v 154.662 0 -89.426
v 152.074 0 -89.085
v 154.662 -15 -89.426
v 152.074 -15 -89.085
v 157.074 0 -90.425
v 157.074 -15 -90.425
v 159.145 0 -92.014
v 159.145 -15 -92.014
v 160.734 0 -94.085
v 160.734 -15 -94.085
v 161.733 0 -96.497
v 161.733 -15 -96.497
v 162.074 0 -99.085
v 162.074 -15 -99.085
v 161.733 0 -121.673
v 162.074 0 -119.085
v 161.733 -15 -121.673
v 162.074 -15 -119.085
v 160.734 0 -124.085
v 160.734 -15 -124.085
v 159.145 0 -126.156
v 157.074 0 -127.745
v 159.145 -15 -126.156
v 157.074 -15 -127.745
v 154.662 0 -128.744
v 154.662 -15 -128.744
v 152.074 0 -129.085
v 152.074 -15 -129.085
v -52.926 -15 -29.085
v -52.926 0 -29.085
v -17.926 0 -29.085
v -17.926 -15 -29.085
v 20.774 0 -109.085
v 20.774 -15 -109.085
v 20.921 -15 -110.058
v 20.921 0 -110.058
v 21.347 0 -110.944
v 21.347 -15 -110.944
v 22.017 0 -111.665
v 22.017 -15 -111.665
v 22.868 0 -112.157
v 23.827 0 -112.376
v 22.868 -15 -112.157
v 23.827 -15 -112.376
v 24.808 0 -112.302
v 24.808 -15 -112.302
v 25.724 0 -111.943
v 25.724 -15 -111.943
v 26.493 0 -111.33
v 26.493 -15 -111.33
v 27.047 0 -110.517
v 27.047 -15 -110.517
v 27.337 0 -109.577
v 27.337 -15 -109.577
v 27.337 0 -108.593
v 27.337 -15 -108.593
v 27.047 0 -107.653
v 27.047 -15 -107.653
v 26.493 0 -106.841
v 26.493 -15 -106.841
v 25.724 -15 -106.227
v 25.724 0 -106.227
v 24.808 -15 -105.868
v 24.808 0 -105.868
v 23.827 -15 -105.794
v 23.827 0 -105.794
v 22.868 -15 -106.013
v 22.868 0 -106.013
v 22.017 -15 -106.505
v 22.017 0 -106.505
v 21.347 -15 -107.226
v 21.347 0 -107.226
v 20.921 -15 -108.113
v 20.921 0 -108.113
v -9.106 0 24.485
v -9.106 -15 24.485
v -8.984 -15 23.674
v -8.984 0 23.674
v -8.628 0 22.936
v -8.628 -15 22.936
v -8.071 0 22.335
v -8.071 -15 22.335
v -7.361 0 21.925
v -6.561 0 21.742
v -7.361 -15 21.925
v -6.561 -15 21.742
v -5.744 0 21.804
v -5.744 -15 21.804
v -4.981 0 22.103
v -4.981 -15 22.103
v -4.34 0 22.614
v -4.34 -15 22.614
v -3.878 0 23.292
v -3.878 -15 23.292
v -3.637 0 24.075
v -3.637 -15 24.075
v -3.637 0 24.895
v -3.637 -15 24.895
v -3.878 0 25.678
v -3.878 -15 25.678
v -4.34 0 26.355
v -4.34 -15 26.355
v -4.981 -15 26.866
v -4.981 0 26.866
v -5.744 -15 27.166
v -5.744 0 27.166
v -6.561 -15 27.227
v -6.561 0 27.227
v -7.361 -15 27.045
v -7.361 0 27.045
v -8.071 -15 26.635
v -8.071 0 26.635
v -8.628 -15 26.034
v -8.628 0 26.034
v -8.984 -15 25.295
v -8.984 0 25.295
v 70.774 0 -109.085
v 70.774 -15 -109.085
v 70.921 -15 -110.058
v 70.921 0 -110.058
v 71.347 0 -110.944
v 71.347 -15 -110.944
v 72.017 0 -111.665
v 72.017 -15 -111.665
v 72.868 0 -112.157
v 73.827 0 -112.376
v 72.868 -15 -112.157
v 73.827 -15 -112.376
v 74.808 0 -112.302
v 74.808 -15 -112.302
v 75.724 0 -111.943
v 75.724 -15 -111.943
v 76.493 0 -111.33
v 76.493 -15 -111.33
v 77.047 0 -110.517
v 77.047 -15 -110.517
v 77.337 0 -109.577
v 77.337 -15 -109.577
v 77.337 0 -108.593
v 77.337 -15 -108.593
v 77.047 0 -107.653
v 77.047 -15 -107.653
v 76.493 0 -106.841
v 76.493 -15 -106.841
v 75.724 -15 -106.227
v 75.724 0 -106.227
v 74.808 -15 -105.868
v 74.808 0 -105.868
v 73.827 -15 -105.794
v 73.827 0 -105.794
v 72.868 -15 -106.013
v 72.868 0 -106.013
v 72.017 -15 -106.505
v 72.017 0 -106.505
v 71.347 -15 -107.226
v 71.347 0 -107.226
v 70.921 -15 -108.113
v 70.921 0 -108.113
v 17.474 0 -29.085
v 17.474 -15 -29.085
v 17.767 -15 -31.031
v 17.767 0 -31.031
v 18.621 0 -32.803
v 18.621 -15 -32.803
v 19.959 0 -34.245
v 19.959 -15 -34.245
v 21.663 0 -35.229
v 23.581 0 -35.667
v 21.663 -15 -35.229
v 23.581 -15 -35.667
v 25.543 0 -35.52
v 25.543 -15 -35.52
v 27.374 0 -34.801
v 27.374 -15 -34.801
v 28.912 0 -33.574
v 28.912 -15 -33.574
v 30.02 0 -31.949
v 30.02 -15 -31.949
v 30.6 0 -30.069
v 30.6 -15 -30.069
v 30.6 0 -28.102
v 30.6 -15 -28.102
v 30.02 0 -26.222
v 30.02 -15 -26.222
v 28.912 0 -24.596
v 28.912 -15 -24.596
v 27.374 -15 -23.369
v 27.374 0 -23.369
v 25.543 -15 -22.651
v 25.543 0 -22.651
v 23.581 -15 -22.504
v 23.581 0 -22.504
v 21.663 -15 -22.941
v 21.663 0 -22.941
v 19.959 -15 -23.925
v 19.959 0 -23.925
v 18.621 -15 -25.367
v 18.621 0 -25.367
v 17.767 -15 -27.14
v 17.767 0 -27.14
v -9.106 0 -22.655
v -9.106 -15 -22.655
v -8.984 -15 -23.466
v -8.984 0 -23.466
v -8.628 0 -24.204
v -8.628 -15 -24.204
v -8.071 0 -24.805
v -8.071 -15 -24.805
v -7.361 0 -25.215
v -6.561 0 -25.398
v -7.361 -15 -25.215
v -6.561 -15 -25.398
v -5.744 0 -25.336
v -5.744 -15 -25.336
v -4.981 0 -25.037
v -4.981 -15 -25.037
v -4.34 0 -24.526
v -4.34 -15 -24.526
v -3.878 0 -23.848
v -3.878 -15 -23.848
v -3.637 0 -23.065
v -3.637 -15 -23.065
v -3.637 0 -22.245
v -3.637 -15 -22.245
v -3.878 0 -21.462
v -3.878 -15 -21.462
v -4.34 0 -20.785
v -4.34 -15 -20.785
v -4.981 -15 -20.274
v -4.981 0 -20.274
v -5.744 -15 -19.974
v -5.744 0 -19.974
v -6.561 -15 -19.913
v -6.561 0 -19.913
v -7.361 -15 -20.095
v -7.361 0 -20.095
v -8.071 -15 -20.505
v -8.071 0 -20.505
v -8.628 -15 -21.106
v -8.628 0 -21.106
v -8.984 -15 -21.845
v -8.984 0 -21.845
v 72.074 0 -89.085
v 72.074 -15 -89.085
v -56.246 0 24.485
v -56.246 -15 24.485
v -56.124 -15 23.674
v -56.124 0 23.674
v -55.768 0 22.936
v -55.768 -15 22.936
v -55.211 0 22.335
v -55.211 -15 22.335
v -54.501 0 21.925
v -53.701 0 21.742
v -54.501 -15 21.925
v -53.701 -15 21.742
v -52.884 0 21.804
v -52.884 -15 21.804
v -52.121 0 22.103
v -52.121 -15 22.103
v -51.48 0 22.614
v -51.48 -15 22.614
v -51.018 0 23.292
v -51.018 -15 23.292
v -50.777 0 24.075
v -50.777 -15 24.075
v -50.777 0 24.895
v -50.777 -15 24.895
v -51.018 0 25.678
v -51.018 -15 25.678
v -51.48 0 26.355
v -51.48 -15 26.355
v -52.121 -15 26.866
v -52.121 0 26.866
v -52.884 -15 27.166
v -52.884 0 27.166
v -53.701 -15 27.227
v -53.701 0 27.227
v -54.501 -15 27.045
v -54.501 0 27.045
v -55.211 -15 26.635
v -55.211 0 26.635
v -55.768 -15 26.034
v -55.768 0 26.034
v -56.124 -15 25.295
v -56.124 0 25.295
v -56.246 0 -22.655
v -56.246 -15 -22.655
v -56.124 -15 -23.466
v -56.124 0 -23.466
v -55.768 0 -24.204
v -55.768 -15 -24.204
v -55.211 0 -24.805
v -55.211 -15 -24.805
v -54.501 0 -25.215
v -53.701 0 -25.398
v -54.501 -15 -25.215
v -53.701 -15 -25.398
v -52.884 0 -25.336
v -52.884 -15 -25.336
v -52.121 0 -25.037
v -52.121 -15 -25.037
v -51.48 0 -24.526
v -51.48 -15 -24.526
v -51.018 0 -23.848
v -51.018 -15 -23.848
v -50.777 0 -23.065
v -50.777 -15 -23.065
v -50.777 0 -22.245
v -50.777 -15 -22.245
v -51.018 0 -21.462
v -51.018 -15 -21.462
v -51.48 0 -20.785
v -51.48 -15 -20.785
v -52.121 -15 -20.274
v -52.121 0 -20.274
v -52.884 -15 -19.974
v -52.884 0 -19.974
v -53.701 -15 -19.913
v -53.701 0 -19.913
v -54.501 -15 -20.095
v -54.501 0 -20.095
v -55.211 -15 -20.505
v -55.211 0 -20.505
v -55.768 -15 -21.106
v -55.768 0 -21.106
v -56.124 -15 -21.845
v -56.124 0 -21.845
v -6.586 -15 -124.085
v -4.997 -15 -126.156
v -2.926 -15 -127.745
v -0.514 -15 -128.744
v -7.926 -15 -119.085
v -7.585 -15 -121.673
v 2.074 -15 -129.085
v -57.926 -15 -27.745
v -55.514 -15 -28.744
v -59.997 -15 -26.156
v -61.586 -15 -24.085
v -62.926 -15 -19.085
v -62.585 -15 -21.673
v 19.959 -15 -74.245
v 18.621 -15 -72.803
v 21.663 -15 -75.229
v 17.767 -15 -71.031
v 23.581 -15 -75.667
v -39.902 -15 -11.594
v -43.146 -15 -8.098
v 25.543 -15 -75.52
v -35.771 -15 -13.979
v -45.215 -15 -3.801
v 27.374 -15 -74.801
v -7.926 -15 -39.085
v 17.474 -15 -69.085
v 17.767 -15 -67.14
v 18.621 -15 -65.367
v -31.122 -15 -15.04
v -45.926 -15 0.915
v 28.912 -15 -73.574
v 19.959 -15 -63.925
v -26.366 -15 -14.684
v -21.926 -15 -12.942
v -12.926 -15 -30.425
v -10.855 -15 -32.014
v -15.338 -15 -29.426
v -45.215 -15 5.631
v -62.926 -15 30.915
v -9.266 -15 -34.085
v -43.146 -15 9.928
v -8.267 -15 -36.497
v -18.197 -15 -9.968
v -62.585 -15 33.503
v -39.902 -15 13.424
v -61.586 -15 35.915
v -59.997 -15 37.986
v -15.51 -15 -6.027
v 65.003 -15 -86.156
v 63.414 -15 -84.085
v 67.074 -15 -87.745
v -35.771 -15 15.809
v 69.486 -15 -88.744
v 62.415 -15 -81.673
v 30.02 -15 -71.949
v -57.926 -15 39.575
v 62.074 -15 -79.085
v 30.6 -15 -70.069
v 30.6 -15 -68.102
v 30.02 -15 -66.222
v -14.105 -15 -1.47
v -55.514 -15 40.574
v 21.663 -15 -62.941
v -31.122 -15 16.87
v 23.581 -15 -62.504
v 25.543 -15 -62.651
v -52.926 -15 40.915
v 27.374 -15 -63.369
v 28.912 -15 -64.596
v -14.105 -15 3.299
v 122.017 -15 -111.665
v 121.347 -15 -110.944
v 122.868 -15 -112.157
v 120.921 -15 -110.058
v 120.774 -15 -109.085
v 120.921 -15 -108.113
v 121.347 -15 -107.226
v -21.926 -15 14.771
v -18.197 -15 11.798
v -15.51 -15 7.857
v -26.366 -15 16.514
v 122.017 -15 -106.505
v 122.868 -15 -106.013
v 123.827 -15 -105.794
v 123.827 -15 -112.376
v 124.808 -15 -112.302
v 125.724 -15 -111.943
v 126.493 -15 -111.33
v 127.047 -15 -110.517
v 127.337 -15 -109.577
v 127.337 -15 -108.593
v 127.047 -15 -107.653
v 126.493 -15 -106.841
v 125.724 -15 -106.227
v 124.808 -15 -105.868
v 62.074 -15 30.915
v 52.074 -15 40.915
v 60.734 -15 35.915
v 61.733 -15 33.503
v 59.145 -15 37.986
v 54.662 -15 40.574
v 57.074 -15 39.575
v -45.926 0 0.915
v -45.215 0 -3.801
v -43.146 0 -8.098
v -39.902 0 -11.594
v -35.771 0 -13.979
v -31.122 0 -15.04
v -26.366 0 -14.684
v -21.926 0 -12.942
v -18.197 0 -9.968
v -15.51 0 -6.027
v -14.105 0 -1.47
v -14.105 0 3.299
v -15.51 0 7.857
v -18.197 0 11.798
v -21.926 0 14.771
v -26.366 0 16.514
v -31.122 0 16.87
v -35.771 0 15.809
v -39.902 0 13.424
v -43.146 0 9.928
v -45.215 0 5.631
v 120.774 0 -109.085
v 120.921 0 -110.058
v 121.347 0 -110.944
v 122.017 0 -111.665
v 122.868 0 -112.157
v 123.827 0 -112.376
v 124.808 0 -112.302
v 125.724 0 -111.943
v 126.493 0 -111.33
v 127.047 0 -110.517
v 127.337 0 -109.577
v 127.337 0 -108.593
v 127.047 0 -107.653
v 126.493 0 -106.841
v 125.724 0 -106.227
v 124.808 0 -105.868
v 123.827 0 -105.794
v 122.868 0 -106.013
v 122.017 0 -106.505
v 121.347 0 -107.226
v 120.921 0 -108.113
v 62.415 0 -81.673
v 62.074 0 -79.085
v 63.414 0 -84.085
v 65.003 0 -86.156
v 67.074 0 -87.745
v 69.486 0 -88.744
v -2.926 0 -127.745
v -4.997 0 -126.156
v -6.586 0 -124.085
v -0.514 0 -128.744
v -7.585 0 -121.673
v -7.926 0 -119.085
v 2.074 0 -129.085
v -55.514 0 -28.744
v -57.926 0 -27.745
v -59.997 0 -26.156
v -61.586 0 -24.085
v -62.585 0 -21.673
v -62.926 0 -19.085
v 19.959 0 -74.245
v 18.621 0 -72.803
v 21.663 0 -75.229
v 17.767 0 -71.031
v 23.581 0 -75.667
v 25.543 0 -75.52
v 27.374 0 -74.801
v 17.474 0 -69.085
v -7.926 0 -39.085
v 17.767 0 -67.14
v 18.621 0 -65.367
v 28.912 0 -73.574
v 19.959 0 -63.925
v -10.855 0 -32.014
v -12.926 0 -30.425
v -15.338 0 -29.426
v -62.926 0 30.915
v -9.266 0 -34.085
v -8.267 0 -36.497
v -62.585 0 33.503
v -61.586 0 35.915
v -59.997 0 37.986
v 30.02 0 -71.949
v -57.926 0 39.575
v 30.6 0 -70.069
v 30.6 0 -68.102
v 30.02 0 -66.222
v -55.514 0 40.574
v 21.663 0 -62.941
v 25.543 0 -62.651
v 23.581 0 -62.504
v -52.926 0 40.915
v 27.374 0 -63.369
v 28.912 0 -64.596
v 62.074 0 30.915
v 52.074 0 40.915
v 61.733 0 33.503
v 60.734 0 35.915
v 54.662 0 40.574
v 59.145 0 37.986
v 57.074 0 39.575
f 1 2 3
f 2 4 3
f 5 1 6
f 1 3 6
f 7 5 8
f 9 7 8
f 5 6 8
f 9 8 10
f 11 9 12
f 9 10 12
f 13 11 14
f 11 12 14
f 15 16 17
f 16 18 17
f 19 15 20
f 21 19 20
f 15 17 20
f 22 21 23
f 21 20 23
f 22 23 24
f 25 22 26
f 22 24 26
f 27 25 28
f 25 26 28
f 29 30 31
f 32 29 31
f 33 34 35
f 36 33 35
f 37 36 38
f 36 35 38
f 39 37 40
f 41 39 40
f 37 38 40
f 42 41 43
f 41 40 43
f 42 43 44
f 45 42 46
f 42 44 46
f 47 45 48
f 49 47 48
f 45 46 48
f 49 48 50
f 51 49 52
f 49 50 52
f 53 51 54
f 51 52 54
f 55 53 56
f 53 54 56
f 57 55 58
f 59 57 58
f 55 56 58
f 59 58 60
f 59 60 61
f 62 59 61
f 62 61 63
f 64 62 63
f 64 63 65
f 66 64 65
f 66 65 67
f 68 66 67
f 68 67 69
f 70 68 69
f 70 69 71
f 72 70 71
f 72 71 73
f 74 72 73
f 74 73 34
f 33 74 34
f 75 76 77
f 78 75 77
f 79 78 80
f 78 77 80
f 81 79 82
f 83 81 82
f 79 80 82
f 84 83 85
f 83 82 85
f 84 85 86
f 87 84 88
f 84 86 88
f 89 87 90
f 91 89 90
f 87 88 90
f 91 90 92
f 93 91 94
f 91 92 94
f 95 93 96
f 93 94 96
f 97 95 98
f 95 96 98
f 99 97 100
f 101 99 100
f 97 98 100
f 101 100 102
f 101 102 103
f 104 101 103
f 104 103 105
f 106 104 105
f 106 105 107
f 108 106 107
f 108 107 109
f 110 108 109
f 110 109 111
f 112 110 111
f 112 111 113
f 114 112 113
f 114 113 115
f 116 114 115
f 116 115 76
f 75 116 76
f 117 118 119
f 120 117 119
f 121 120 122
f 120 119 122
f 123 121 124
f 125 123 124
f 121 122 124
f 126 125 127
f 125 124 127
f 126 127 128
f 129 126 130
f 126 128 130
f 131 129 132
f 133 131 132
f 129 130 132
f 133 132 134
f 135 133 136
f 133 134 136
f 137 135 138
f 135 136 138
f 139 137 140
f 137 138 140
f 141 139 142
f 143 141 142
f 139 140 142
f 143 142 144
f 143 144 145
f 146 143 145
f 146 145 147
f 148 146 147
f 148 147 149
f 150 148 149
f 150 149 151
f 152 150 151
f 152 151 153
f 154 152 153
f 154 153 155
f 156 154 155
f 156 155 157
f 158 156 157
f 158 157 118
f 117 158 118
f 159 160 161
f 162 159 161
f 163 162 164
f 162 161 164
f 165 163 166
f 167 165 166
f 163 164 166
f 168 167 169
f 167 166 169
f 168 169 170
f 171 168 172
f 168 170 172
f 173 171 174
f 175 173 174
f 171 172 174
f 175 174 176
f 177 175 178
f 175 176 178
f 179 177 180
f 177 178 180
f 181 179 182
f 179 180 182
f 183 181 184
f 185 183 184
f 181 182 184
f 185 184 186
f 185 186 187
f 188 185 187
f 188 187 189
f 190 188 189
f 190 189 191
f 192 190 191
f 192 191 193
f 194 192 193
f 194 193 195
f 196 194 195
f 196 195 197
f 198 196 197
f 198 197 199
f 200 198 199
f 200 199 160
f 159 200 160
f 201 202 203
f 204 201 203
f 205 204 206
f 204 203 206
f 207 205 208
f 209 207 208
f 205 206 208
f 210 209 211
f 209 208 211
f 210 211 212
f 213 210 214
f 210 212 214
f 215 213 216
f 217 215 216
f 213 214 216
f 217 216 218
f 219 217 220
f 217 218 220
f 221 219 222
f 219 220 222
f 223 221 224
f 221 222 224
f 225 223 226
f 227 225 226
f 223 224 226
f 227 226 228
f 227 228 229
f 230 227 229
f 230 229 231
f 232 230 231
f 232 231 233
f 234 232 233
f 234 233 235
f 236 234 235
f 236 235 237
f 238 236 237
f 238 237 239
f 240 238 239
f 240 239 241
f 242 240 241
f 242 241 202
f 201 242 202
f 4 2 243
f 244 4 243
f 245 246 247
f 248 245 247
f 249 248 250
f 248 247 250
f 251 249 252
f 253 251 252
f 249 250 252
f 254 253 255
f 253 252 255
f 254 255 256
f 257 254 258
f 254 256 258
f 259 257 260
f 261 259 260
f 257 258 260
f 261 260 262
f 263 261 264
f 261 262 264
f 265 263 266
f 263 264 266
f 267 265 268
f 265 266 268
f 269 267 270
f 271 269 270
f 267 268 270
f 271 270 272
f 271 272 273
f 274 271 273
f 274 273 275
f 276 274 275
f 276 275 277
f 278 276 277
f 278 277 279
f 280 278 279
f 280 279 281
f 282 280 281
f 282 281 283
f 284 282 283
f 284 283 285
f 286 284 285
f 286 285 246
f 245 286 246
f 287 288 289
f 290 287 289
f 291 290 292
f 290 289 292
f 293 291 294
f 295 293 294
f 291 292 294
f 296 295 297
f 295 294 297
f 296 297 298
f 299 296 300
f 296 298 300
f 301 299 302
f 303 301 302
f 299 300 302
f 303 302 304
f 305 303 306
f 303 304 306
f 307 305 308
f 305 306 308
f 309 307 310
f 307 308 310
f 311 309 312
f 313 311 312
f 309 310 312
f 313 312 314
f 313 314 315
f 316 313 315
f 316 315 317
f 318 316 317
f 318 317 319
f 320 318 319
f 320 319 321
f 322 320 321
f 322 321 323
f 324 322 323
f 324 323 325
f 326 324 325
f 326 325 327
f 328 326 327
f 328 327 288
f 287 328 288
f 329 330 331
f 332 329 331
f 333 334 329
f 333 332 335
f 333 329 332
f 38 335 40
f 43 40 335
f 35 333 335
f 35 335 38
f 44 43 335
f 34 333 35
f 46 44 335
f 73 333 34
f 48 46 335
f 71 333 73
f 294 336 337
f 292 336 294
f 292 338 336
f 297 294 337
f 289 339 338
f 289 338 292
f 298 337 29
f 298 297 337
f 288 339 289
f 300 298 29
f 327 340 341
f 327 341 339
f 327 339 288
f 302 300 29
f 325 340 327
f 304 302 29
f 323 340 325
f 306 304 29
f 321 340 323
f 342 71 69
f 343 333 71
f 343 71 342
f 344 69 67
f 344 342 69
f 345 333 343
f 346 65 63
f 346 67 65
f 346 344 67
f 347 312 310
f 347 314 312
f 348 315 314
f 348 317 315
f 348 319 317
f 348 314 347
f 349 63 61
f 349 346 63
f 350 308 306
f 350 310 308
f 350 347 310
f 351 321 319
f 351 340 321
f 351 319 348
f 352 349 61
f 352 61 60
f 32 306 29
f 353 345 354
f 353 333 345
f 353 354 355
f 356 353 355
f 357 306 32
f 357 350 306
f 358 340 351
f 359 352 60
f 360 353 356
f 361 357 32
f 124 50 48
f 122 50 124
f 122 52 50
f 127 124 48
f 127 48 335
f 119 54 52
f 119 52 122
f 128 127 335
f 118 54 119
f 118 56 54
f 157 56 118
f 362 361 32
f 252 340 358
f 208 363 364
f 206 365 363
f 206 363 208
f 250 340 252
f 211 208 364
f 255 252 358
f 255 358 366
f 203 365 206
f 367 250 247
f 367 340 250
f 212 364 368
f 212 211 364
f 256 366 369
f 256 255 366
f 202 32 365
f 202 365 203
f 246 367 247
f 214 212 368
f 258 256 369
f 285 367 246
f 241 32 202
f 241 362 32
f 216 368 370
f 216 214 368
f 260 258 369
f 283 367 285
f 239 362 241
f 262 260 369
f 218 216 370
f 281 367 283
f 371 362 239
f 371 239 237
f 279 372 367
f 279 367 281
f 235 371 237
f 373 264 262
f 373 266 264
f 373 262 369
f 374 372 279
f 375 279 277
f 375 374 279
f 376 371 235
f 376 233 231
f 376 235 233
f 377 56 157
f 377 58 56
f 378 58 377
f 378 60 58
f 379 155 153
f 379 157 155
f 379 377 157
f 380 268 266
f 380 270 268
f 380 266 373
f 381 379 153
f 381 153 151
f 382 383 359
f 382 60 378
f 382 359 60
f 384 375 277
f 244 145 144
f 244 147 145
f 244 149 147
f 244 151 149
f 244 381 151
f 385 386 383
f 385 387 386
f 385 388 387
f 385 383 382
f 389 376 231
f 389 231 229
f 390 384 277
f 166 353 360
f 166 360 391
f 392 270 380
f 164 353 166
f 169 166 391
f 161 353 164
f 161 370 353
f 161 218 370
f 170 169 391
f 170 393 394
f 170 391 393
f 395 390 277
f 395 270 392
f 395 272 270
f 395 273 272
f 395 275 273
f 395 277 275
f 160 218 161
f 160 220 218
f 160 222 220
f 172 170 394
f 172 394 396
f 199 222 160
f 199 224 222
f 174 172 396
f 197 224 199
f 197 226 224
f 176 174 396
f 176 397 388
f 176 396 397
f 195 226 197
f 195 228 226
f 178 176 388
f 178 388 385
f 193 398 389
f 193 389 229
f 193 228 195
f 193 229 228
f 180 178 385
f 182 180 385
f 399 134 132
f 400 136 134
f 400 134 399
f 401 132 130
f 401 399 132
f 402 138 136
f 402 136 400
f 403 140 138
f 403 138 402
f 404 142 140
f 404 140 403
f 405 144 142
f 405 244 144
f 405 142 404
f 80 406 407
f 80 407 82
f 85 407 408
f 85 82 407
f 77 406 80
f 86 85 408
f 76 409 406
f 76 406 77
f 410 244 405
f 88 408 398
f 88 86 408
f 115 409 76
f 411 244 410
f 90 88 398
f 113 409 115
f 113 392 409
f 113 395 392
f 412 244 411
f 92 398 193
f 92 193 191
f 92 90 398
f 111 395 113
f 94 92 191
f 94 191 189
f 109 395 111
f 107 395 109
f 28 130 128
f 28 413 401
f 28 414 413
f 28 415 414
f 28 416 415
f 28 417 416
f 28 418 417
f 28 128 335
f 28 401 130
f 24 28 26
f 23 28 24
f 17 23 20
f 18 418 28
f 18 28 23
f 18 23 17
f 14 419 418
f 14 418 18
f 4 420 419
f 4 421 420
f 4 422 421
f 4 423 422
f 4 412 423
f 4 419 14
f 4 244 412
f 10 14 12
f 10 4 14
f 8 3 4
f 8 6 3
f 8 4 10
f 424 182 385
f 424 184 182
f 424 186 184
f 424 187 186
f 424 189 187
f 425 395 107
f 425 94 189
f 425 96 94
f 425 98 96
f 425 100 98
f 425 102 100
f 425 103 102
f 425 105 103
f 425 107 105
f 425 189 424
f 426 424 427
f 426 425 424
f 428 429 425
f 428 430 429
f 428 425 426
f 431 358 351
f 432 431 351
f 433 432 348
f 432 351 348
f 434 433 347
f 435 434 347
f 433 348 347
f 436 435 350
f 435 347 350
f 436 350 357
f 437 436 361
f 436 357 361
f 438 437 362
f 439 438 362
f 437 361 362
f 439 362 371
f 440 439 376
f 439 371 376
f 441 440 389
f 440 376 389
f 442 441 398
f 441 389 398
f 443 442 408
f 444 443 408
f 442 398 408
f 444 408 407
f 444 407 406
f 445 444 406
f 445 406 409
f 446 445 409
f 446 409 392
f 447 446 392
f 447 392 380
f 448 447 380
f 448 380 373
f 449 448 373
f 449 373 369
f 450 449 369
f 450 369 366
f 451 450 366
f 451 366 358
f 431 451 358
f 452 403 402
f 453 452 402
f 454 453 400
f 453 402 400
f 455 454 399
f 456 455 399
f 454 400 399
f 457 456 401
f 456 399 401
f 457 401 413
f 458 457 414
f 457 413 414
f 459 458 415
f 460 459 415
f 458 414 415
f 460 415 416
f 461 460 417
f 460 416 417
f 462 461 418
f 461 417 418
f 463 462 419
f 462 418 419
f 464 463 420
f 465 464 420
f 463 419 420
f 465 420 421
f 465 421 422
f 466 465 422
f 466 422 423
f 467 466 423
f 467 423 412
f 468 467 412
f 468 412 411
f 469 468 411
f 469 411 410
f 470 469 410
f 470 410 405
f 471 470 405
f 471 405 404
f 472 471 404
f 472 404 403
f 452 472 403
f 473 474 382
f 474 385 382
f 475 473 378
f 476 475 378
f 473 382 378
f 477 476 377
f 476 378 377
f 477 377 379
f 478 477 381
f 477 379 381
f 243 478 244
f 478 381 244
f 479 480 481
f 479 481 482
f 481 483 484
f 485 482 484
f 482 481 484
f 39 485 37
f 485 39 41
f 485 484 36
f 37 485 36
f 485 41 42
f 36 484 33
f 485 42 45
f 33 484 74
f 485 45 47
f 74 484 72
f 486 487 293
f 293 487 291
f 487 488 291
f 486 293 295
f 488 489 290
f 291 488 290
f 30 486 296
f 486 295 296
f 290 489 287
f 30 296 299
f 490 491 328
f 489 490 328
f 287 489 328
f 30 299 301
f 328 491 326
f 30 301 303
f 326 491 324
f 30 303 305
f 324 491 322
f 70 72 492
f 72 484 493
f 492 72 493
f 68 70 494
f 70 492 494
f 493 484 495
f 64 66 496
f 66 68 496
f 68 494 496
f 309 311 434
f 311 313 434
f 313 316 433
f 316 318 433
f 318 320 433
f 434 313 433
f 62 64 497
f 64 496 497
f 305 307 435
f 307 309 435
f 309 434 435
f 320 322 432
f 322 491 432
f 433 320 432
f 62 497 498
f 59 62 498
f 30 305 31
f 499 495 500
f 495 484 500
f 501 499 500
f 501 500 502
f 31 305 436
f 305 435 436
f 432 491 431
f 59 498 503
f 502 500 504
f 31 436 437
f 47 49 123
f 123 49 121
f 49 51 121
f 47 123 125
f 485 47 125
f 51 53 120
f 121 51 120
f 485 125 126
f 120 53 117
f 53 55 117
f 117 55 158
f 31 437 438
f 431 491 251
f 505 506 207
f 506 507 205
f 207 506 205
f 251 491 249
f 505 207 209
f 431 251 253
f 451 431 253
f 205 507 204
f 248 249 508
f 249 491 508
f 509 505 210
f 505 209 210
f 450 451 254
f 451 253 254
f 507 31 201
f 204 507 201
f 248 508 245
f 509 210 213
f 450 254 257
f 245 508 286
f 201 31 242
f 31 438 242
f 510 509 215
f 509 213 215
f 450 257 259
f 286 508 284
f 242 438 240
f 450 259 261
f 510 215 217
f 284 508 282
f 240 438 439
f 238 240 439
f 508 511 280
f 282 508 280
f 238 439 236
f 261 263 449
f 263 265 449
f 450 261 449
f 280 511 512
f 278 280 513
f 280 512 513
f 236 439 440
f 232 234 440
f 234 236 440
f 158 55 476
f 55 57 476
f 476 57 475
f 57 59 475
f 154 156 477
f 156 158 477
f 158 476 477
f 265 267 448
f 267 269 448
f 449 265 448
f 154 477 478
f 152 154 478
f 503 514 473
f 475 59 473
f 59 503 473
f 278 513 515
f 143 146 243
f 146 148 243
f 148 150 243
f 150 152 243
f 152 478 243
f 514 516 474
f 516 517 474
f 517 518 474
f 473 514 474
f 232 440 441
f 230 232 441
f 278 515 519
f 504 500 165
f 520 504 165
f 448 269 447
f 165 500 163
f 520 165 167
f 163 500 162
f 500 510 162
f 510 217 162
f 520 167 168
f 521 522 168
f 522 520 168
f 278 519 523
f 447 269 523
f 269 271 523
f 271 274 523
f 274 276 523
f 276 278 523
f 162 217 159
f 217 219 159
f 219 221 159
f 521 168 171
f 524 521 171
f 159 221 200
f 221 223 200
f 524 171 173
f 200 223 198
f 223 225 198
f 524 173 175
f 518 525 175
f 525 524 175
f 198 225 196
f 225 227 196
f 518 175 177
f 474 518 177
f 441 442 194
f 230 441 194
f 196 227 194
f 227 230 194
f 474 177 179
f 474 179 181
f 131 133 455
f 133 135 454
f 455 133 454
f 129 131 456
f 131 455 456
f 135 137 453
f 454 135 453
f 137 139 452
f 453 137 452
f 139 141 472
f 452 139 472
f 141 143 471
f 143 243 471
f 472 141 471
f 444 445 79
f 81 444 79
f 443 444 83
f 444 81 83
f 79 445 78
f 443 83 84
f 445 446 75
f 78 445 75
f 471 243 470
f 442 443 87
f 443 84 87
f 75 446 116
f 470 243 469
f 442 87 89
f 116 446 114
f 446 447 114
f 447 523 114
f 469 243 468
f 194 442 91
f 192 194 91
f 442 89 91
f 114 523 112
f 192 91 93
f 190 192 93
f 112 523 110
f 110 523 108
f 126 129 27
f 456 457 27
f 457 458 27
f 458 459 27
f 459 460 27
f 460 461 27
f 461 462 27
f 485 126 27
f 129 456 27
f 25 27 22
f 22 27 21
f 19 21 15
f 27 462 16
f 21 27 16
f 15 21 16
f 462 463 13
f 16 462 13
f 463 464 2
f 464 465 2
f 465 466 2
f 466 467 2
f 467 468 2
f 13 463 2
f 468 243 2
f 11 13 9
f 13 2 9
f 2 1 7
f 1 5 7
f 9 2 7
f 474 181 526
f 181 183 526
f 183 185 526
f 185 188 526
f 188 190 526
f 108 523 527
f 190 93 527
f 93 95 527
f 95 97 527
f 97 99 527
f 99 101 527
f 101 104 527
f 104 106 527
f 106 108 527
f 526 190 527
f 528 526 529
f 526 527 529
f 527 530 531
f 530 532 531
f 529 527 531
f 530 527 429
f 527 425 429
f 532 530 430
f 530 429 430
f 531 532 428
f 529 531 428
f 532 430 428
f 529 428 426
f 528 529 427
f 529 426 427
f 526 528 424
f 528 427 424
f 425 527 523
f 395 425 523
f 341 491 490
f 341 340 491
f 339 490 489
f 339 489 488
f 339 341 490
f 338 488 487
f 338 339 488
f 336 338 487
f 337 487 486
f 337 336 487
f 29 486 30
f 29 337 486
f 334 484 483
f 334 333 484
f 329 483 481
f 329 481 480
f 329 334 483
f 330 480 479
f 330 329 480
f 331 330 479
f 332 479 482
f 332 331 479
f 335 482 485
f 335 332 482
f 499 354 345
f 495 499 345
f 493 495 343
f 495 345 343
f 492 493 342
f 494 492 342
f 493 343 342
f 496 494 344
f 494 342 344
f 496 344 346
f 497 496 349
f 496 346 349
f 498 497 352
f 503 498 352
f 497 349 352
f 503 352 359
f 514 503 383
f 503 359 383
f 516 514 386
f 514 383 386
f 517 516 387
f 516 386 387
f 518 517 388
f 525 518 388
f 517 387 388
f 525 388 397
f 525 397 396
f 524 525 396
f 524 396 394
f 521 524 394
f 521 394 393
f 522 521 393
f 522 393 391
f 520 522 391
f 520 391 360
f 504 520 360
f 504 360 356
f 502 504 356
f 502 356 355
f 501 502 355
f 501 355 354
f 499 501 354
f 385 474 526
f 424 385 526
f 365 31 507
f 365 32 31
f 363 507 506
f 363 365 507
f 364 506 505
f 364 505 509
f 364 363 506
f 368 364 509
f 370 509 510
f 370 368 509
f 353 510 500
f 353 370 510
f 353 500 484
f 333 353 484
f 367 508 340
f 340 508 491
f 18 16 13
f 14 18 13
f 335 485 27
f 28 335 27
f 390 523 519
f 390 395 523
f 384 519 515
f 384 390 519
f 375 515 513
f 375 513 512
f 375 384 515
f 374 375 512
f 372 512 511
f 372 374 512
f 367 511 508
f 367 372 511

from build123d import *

# Parameters (mm, degrees)
F1_DEPTH = 15
F2_D     = 13.2
F3_D     = 6.6
F4_R     = 10
F5_D     = 32
F6_D     = 5.5


with BuildPart() as f1:
    # F0 (on Front) → F1 (new body)
    with BuildSketch(Plane.XZ):
        Polygon((62.0740194619, 40.9148037434), (-57.9259805381, 40.9148037434), (-62.9259805381, 40.9148037434), (-62.9259805381, -29.0851962566), (-57.9259805381, -29.0851962566), (-7.9259805381, -29.0851962566), (-7.9259805381, -129.0851962566), (162.0740194619, -129.0851962566), (162.0740194619, -89.0851962566), (62.0740194619, -89.0851962566), align=None)
    extrude(amount=F1_DEPTH)

    # F2 (through all)
    with Locations(Plane(origin=(0, 0, 0), x_dir=(1, 0, 0), z_dir=(0, 1, 0))):
        with Locations((24.0740194619, 69.0851962566), (24.0740194619, 29.0851962566)):
            Hole(F2_D / 2)

    # F3 (through all)
    with Locations(Plane(origin=(0, 0, 0), x_dir=(1, 0, 0), z_dir=(0, 1, 0))):
        with Locations((24.0740194619, 109.0851962566), (74.0740194619, 109.0851962566), (124.0740194619, 109.0851962566)):
            Hole(F3_D / 2)

    # F4
    f4_edges = [f1.edges().sort_by_distance(p)[0] for p in [
        (62.074019, -7.5, 40.914804),
        (62.074019, -7.5, -89.085196),
        (162.074019, -7.5, -129.085196),
        (162.074019, -7.5, -89.085196),
        (-7.925981, -7.5, -129.085196),
        (-7.925981, -7.5, -29.085196),
        (-62.925981, -7.5, 40.914804),
        (-62.925981, -7.5, -29.085196),
    ]]
    fillet(f4_edges, radius=F4_R)

    # F5 (through all)
    with Locations(Plane(origin=(0, 0, 0), x_dir=(1, 0, 0), z_dir=(0, 1, 0))):
        with Locations((-29.9259805381, -0.9148037434)):
            Hole(F5_D / 2)

    # F6 (through all)
    with Locations(Plane(origin=(0, 0, 0), x_dir=(1, 0, 0), z_dir=(0, 1, 0))):
        with Locations((-53.4959805381, -24.4848037434), (-6.3559805381, -24.4848037434), (-6.3559805381, 22.6551962566), (-53.4959805381, 22.6551962566)):
            Hole(F6_D / 2)


solid = f1.part
